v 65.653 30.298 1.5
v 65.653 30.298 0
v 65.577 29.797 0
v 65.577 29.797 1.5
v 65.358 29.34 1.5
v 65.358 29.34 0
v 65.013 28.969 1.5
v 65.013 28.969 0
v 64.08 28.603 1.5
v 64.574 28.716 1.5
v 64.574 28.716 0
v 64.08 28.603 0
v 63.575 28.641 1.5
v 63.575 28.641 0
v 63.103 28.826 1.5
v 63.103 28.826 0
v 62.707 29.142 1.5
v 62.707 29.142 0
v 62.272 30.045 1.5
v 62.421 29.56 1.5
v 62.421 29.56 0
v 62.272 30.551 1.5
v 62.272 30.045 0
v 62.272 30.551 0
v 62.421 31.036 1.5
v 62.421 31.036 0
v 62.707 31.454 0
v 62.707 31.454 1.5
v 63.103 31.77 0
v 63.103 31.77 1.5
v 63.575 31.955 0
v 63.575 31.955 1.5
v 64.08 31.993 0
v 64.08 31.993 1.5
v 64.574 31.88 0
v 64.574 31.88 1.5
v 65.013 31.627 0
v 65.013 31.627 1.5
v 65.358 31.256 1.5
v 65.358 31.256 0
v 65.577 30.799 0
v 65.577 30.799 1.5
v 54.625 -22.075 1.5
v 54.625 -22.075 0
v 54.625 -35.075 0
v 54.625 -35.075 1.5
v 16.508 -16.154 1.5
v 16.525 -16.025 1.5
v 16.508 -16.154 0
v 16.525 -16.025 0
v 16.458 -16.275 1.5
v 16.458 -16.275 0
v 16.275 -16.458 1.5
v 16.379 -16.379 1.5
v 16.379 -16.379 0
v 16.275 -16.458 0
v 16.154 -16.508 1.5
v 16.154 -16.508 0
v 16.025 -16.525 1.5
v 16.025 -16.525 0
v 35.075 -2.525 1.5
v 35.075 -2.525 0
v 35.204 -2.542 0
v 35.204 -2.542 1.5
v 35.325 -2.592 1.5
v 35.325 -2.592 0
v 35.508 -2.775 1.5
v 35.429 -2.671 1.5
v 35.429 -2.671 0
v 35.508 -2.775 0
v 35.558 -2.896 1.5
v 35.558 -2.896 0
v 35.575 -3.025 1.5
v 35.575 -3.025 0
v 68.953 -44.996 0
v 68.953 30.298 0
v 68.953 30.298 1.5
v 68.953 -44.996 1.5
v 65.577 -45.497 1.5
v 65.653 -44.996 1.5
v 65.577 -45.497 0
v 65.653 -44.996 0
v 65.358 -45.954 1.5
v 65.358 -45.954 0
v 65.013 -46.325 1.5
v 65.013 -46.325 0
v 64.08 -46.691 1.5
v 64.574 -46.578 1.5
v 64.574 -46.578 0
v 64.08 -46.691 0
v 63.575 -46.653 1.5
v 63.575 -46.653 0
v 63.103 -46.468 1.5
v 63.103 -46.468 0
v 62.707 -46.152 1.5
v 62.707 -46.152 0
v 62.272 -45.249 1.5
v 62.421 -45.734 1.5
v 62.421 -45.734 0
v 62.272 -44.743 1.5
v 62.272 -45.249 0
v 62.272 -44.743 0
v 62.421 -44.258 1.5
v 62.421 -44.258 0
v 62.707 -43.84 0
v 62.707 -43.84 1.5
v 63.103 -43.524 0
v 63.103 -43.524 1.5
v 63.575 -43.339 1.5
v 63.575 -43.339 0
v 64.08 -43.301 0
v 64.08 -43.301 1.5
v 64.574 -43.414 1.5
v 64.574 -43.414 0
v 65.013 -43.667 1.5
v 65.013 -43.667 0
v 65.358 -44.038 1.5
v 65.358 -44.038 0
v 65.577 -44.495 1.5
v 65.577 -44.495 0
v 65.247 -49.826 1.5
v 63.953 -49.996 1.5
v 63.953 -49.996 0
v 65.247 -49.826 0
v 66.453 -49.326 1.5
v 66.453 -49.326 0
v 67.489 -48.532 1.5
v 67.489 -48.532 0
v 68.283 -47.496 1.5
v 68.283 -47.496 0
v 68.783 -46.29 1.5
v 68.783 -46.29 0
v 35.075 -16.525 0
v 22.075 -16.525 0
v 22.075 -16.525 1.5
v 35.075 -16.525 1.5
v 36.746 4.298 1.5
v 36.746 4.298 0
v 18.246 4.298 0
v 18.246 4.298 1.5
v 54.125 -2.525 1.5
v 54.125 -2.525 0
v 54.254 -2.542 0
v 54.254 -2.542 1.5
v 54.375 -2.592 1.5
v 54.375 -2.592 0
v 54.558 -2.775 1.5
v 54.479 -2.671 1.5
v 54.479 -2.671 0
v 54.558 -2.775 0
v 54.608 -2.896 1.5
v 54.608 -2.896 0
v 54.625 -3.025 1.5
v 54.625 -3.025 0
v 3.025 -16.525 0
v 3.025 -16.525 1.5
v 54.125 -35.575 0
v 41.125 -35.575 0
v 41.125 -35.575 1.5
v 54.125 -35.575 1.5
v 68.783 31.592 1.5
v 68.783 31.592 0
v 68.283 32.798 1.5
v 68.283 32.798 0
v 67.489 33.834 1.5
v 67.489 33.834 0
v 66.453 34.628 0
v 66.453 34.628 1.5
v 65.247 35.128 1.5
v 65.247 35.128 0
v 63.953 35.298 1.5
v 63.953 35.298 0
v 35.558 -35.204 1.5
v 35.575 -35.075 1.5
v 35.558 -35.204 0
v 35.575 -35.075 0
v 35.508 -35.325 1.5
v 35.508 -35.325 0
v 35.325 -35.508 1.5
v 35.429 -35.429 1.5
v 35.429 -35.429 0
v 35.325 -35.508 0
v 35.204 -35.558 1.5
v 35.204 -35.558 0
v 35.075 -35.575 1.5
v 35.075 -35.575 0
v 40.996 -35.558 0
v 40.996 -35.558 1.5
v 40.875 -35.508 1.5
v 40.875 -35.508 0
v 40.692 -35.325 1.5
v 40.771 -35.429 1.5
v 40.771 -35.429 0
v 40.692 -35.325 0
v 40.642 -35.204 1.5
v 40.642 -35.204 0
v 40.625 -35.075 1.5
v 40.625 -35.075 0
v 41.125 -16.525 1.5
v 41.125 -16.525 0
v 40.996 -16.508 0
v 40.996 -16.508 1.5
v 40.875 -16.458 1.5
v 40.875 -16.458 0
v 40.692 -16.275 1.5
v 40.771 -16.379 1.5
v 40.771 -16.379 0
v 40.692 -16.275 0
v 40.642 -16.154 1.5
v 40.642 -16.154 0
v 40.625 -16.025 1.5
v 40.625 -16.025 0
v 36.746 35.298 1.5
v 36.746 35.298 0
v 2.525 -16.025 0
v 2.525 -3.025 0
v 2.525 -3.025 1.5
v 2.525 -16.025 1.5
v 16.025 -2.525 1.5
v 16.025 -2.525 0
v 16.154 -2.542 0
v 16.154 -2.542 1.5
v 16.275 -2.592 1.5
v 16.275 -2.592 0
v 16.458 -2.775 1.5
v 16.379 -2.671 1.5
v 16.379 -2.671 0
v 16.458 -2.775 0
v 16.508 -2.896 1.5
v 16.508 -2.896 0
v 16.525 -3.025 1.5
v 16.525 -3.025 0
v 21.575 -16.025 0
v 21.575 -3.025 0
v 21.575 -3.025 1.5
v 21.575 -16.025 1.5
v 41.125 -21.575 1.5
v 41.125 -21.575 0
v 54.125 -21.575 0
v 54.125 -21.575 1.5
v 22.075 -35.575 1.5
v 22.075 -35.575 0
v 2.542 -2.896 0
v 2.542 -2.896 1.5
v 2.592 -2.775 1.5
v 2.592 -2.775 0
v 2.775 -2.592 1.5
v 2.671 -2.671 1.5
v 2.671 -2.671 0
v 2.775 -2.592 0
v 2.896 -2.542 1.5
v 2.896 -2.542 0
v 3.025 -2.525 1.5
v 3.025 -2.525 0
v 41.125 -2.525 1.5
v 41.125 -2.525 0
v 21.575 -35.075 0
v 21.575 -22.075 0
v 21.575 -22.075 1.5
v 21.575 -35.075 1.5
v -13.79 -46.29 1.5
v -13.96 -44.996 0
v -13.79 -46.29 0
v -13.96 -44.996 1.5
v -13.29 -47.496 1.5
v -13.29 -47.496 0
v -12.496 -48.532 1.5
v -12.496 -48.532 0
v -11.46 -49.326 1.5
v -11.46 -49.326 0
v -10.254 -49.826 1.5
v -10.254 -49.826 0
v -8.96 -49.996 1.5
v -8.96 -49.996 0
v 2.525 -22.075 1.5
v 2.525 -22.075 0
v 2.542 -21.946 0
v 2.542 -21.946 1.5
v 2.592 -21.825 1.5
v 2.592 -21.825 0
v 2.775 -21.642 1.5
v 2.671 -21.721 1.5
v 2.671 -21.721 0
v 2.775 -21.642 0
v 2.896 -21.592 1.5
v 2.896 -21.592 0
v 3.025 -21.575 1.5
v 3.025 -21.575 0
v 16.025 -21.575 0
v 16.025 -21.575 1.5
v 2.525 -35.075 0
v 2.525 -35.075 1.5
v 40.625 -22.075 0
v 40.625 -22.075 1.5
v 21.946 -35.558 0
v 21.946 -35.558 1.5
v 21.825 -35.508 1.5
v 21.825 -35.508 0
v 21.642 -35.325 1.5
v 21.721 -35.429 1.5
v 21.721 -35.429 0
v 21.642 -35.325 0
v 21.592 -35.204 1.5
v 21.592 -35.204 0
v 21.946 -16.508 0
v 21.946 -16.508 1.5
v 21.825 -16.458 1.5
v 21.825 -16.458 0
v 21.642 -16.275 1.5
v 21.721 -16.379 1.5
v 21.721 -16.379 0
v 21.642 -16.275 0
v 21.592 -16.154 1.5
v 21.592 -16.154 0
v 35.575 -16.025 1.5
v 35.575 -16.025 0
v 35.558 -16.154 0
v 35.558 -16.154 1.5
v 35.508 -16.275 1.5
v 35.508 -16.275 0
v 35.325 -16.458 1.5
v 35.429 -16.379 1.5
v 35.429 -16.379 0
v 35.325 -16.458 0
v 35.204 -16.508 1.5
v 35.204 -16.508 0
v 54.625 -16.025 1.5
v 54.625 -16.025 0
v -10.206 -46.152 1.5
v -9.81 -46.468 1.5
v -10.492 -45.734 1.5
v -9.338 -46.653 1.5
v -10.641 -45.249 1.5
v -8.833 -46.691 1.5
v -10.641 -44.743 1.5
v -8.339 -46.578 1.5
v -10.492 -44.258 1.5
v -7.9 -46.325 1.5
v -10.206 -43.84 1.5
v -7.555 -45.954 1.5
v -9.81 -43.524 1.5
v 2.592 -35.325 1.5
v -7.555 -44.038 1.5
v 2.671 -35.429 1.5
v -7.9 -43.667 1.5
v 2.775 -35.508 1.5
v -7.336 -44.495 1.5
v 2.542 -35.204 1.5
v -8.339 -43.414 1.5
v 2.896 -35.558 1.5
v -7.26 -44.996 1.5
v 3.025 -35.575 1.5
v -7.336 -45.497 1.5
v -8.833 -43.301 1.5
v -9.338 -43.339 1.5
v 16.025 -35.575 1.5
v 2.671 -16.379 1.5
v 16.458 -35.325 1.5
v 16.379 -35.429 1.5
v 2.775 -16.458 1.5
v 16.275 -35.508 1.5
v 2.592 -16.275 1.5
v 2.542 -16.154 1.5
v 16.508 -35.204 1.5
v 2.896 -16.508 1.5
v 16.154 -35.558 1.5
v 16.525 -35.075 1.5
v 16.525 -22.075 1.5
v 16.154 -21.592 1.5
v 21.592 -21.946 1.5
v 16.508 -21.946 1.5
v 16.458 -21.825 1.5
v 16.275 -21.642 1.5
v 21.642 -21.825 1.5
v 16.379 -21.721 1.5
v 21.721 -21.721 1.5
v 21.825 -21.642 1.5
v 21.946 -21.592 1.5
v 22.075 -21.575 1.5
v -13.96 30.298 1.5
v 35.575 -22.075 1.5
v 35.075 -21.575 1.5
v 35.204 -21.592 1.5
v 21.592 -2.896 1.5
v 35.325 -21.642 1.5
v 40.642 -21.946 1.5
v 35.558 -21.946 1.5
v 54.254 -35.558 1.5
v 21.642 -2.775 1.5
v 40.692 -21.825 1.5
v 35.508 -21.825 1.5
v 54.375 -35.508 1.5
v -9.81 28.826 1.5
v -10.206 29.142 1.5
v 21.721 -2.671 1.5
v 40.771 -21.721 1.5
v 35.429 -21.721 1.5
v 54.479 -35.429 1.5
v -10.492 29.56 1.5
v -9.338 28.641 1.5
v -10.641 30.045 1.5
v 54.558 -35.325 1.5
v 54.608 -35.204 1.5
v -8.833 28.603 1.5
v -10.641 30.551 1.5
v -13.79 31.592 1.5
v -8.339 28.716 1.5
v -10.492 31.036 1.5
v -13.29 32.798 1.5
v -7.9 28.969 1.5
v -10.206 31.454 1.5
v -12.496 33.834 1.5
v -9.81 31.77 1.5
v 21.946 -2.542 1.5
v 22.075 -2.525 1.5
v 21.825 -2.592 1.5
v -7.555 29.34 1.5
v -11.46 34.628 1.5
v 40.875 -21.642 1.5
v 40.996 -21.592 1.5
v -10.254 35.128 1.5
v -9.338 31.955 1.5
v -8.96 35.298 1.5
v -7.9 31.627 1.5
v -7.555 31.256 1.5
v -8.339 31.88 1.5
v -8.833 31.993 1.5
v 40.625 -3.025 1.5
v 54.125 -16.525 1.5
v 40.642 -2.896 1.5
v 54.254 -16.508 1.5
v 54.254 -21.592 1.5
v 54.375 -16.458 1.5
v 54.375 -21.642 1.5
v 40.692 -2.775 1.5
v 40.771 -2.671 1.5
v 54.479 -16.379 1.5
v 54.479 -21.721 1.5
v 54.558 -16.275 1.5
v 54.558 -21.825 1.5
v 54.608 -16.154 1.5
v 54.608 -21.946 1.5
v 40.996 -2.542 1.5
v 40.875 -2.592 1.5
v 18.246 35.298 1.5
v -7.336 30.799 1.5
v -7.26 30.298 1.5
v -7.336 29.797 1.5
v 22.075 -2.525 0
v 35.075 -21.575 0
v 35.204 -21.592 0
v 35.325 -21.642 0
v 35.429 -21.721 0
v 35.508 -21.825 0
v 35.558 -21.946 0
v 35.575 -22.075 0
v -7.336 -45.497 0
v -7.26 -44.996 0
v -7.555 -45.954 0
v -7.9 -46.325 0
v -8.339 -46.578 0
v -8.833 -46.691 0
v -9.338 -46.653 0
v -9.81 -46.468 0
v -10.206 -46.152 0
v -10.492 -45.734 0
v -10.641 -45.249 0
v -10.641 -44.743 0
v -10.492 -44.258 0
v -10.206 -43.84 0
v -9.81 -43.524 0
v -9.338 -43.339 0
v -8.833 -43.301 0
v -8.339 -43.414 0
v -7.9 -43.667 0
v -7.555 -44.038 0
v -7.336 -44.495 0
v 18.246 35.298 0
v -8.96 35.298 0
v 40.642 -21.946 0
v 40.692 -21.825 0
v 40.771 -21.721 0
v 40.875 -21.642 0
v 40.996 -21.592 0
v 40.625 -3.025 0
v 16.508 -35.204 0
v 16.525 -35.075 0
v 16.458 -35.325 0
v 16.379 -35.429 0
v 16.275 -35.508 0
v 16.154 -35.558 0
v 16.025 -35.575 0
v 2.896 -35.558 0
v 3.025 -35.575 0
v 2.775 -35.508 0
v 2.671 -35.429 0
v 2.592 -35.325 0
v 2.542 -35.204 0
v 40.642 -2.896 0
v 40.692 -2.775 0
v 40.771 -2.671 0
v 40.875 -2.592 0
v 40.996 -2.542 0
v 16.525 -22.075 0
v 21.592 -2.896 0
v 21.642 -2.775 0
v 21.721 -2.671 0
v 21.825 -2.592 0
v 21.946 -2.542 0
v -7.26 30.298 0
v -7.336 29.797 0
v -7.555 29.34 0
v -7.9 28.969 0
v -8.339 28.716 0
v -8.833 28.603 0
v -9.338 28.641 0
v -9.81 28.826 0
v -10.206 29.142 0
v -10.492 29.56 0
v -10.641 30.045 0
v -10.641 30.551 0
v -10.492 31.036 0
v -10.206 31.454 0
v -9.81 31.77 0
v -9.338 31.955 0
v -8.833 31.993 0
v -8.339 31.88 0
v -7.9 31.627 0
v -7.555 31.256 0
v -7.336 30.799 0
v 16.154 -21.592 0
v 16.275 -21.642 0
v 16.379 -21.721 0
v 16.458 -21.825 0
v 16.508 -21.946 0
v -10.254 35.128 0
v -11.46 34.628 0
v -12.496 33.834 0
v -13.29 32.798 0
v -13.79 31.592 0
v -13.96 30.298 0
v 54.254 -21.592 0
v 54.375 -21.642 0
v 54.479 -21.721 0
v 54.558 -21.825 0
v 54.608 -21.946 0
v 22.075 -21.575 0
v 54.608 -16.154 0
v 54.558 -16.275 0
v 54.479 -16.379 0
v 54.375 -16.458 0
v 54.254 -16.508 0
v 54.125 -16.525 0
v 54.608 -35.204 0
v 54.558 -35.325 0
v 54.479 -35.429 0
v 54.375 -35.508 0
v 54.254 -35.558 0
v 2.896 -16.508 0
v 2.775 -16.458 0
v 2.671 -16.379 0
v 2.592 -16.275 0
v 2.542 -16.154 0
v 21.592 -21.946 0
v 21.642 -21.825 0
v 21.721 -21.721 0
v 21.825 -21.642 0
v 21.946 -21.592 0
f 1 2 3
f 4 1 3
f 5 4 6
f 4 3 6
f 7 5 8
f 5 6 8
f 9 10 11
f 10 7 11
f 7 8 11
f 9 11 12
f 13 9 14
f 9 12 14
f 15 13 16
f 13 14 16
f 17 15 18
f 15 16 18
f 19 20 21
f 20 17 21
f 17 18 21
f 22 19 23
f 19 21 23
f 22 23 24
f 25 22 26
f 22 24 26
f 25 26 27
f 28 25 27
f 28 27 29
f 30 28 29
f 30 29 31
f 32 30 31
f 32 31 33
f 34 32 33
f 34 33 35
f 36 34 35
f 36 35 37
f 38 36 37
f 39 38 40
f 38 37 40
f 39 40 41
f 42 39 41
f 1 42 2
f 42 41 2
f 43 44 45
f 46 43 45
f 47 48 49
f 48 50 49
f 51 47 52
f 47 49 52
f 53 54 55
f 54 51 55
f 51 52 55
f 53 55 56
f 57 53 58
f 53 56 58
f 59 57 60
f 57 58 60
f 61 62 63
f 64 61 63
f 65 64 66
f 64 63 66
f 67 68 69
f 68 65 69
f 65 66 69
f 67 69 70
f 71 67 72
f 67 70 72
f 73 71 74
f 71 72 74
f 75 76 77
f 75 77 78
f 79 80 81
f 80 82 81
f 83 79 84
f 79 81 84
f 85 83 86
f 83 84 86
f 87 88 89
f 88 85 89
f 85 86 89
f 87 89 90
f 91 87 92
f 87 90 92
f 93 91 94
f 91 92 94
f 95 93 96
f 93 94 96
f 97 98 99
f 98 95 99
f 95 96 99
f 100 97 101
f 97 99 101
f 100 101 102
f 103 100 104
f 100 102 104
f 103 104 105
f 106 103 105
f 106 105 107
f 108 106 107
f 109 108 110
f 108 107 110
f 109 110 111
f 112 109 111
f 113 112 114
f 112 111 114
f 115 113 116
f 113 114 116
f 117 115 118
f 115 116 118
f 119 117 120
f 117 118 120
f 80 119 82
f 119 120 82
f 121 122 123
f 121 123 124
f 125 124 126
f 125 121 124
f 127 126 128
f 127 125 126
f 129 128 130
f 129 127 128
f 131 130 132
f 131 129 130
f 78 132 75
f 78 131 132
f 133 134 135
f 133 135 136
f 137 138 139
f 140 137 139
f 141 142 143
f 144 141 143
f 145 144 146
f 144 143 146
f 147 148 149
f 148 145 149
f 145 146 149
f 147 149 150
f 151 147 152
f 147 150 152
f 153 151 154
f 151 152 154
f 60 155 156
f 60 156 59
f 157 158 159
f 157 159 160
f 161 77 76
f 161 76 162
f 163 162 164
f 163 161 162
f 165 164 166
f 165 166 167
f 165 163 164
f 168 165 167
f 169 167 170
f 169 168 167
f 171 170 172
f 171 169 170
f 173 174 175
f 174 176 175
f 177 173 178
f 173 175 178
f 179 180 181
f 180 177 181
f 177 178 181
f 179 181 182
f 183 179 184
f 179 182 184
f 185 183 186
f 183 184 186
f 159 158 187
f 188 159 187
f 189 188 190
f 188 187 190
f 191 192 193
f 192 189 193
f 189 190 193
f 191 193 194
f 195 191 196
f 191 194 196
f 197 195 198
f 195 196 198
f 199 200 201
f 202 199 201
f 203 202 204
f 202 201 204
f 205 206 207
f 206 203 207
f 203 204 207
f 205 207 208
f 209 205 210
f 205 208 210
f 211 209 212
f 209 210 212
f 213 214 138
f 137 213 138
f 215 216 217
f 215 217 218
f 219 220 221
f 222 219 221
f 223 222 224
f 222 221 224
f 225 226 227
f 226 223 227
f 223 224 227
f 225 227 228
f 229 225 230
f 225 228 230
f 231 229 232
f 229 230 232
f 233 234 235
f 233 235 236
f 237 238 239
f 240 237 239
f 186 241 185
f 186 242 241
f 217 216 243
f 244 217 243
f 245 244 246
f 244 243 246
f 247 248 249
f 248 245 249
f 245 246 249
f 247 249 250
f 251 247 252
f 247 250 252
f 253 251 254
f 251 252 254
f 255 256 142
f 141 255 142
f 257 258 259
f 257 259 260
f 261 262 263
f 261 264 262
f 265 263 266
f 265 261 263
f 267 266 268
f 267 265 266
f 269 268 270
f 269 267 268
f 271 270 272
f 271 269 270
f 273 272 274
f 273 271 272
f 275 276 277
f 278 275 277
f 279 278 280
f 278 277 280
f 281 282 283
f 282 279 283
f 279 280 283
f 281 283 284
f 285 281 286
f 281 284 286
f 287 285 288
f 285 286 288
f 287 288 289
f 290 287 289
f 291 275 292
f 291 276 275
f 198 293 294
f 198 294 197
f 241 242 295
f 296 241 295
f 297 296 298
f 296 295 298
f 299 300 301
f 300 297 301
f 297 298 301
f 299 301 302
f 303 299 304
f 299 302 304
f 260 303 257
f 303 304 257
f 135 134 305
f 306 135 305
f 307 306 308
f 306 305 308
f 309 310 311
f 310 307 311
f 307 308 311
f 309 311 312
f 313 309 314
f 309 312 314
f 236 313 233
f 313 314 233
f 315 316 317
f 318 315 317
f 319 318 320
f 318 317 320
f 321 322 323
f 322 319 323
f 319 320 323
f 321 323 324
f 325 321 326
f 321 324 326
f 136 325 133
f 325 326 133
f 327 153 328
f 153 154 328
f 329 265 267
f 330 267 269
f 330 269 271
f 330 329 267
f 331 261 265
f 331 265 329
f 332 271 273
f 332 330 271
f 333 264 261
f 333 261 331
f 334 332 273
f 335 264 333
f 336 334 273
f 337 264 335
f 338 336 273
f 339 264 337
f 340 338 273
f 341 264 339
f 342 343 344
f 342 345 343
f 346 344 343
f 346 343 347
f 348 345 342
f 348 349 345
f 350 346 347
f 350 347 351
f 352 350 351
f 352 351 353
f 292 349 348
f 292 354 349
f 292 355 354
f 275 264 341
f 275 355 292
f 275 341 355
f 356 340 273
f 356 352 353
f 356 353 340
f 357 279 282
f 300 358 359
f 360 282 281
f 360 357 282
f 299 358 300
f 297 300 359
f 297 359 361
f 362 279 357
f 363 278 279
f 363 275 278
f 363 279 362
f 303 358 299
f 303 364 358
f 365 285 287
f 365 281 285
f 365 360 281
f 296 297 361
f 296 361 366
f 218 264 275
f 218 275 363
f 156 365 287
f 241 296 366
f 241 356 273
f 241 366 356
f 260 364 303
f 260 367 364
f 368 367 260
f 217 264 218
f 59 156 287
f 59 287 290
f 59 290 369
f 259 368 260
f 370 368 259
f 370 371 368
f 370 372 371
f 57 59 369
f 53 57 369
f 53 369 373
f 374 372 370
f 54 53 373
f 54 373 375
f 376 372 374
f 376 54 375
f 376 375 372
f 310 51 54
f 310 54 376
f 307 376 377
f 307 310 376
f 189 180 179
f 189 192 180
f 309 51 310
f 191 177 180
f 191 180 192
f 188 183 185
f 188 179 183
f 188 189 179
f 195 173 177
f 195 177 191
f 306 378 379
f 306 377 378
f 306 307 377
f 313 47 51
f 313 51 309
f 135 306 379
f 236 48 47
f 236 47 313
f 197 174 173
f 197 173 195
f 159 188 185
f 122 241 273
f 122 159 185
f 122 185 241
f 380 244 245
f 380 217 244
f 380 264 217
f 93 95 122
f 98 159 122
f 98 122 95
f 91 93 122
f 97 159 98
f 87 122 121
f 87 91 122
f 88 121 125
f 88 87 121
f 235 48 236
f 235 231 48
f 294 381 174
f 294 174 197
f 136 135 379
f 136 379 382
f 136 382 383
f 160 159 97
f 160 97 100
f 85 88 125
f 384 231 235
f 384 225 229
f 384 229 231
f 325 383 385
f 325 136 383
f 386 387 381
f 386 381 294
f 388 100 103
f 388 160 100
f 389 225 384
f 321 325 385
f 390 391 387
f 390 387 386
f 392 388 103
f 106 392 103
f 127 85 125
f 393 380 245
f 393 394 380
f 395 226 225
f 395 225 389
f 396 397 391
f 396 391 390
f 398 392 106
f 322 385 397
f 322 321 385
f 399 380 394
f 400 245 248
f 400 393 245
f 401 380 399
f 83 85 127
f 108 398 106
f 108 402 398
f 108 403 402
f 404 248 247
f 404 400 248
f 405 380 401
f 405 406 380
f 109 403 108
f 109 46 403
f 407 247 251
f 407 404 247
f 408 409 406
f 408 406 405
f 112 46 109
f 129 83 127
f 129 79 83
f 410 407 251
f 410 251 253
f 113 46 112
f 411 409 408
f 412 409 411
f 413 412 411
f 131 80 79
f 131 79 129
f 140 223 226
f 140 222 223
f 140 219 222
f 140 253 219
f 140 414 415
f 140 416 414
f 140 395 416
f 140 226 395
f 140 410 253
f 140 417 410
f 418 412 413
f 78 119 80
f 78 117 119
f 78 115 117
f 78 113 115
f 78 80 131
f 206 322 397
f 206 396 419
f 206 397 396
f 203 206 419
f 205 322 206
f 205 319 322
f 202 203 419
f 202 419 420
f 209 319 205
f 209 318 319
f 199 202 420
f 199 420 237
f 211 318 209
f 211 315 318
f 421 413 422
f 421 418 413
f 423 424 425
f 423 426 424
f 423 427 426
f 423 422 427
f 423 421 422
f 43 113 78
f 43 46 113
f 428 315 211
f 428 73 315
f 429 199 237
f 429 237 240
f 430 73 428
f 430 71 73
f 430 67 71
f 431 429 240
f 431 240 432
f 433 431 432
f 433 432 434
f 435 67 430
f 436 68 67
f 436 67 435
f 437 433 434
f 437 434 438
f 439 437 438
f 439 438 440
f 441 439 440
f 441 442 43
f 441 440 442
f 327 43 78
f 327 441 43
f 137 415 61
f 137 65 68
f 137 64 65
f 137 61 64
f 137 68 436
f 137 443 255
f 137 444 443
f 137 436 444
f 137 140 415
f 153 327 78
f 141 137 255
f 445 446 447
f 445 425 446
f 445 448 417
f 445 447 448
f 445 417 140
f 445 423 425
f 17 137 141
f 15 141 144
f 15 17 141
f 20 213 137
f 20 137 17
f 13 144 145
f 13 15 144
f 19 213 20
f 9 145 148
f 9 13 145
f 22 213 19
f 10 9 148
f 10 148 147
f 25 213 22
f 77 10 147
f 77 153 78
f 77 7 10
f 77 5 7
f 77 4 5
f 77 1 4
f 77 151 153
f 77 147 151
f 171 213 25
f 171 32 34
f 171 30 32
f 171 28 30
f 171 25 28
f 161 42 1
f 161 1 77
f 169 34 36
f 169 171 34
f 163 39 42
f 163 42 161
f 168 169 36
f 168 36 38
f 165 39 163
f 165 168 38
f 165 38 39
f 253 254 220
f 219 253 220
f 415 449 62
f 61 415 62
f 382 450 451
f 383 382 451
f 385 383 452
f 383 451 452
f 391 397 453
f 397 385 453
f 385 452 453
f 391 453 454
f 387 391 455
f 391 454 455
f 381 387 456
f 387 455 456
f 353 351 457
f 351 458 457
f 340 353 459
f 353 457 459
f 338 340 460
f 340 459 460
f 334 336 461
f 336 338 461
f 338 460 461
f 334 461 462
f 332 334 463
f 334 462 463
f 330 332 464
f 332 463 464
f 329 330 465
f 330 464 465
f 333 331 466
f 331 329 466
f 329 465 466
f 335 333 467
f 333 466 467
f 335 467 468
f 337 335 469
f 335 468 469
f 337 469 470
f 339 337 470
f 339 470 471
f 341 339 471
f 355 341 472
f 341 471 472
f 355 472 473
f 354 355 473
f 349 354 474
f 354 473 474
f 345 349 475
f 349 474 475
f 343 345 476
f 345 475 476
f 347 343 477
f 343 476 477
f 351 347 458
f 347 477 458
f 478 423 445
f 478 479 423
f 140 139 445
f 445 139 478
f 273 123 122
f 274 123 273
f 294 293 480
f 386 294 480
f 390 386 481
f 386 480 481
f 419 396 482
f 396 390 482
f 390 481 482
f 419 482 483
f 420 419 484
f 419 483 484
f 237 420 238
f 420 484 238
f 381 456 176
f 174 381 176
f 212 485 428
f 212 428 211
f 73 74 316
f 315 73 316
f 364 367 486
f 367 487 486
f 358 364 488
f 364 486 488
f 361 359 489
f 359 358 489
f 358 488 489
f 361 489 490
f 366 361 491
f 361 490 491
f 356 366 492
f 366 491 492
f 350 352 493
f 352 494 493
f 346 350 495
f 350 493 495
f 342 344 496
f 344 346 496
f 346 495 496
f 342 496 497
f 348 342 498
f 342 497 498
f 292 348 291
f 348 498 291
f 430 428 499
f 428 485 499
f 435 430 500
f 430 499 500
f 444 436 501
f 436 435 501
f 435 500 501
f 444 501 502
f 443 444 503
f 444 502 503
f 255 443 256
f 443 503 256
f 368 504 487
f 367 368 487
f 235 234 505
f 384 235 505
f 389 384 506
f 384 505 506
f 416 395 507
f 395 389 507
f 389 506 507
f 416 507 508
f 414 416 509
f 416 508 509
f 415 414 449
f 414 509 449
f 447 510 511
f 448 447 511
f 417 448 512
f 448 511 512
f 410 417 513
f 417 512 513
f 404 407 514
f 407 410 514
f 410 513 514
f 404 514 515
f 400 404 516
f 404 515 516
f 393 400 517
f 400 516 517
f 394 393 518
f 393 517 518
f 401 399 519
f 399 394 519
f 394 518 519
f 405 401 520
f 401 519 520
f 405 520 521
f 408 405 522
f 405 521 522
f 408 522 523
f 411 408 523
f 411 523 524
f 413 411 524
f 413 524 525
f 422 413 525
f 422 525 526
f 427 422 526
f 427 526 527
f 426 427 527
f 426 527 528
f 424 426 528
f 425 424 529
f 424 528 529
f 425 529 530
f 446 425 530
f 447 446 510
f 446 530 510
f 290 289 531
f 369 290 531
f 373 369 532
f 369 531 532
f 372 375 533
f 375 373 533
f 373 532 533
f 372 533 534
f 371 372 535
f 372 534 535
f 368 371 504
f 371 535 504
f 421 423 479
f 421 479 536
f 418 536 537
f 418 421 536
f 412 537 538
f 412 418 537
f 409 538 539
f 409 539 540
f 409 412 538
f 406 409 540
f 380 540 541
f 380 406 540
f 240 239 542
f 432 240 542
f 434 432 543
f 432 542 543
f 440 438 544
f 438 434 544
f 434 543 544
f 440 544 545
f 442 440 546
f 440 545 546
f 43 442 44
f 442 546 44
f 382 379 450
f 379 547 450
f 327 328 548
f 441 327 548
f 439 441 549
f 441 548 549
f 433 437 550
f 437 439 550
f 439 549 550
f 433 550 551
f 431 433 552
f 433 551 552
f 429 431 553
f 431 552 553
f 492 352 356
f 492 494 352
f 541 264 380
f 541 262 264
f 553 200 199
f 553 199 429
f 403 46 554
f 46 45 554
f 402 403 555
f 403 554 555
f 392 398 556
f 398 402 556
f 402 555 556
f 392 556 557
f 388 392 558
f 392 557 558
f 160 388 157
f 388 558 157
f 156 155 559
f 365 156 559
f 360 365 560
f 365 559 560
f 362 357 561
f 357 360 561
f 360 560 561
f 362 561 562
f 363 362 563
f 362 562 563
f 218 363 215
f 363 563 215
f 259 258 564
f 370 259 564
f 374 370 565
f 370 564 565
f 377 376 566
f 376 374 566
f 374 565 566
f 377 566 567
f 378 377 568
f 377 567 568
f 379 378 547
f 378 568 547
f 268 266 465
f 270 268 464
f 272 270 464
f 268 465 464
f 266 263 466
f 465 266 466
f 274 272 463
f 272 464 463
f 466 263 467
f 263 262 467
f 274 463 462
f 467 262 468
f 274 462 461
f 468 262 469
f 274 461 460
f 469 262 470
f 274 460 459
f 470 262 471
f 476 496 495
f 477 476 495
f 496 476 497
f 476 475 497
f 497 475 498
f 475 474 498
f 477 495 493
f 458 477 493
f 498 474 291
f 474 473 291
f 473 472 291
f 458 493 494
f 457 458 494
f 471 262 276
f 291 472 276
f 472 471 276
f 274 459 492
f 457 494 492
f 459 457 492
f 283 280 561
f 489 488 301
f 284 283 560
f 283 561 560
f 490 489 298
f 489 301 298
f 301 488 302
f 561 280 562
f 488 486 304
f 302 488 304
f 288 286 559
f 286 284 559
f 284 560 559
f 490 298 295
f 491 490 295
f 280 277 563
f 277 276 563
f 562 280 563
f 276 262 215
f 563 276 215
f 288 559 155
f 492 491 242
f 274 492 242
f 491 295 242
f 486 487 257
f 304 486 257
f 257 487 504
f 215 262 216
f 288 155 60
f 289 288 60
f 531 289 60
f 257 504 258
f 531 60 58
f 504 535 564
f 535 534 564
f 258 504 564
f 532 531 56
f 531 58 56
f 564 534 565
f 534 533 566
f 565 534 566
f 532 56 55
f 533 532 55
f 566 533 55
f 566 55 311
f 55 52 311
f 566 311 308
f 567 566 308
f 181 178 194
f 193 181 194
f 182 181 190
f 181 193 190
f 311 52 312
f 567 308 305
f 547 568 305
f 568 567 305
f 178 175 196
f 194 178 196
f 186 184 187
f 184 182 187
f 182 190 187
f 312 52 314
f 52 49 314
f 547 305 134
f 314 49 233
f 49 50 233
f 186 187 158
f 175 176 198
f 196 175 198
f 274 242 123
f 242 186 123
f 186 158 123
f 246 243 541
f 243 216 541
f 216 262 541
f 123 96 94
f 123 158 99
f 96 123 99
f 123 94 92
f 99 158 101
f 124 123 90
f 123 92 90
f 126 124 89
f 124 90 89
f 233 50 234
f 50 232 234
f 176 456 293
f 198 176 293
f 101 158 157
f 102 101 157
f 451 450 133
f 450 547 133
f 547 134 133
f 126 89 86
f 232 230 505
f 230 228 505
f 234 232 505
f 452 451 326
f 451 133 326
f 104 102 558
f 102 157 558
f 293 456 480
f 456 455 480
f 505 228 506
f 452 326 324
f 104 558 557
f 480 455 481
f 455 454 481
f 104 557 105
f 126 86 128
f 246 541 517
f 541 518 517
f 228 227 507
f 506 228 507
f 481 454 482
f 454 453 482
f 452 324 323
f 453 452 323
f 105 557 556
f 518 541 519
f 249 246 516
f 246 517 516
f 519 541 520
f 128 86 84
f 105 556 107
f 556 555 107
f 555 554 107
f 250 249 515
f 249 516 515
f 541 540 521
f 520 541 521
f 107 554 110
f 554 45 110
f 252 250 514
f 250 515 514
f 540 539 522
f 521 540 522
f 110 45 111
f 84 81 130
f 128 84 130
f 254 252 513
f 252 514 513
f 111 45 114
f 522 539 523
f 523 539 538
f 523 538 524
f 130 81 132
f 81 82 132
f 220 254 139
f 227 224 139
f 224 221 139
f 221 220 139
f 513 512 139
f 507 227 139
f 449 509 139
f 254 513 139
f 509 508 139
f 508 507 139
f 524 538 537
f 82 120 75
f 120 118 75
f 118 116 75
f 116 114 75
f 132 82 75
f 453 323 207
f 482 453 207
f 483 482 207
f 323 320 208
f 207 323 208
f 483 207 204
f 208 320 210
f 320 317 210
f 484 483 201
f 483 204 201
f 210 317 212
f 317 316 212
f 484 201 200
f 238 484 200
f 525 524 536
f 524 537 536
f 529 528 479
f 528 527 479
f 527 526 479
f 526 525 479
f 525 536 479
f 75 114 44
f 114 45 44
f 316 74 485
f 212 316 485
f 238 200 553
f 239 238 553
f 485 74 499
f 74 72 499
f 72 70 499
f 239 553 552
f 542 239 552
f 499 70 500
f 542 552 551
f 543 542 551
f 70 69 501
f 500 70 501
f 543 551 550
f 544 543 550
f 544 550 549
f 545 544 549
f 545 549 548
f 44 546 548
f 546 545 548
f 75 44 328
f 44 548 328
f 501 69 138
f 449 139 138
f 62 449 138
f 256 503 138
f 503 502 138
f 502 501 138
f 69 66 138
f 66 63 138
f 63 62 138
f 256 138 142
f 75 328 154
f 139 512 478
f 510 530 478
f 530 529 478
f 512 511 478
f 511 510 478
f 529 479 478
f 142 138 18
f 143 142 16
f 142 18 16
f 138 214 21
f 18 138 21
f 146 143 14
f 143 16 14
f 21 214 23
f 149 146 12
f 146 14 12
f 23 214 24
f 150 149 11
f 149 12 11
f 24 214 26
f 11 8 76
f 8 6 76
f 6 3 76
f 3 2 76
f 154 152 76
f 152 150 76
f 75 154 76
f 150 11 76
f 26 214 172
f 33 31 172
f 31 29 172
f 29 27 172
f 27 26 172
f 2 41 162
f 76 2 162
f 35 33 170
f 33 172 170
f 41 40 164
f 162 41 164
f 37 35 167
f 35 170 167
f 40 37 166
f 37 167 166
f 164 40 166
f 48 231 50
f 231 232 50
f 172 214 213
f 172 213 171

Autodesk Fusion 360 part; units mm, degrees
sketch "plate-2026-01-28T23_59_03.859Z" plane through (0, 0, 0) normal (0, 0, 1) x (1, 0, 0)
  line L0 (3.025, -2.525) -> (16.025, -2.525)
  line L1 (3.025, -16.525) -> (16.025, -16.525)
  line L2 (2.525, -3.025) -> (2.525, -16.025)
  line L3 (16.525, -3.025) -> (16.525, -16.025)
  arc A0 (3.025, -2.525) -> (2.525, -3.025) centre (3.025, -3.025) ccw
  arc A1 (16.525, -3.025) -> (16.025, -2.525) centre (16.025, -3.025) ccw
  arc A2 (2.525, -16.025) -> (3.025, -16.525) centre (3.025, -16.025) ccw
  arc A3 (16.025, -16.525) -> (16.525, -16.025) centre (16.025, -16.025) ccw
  line L4 (22.075, -2.525) -> (35.075, -2.525)
  line L5 (22.075, -16.525) -> (35.075, -16.525)
  line L6 (21.575, -3.025) -> (21.575, -16.025)
  line L7 (35.575, -3.025) -> (35.575, -16.025)
  arc A4 (22.075, -2.525) -> (21.575, -3.025) centre (22.075, -3.025) ccw
  arc A5 (35.575, -3.025) -> (35.075, -2.525) centre (35.075, -3.025) ccw
  arc A6 (21.575, -16.025) -> (22.075, -16.525) centre (22.075, -16.025) ccw
  arc A7 (35.075, -16.525) -> (35.575, -16.025) centre (35.075, -16.025) ccw
  line L8 (41.125, -2.525) -> (54.125, -2.525)
  line L9 (41.125, -16.525) -> (54.125, -16.525)
  line L10 (40.625, -3.025) -> (40.625, -16.025)
  line L11 (54.625, -3.025) -> (54.625, -16.025)
  arc A8 (41.125, -2.525) -> (40.625, -3.025) centre (41.125, -3.025) ccw
  arc A9 (54.625, -3.025) -> (54.125, -2.525) centre (54.125, -3.025) ccw
  arc A10 (40.625, -16.025) -> (41.125, -16.525) centre (41.125, -16.025) ccw
  arc A11 (54.125, -16.525) -> (54.625, -16.025) centre (54.125, -16.025) ccw
  line L12 (3.025, -21.575) -> (16.025, -21.575)
  line L13 (3.025, -35.575) -> (16.025, -35.575)
  line L14 (2.525, -22.075) -> (2.525, -35.075)
  line L15 (16.525, -22.075) -> (16.525, -35.075)
  arc A12 (3.025, -21.575) -> (2.525, -22.075) centre (3.025, -22.075) ccw
  arc A13 (16.525, -22.075) -> (16.025, -21.575) centre (16.025, -22.075) ccw
  arc A14 (2.525, -35.075) -> (3.025, -35.575) centre (3.025, -35.075) ccw
  arc A15 (16.025, -35.575) -> (16.525, -35.075) centre (16.025, -35.075) ccw
  line L16 (22.075, -21.575) -> (35.075, -21.575)
  line L17 (22.075, -35.575) -> (35.075, -35.575)
  line L18 (21.575, -22.075) -> (21.575, -35.075)
  line L19 (35.575, -22.075) -> (35.575, -35.075)
  arc A16 (22.075, -21.575) -> (21.575, -22.075) centre (22.075, -22.075) ccw
  arc A17 (35.575, -22.075) -> (35.075, -21.575) centre (35.075, -22.075) ccw
  arc A18 (21.575, -35.075) -> (22.075, -35.575) centre (22.075, -35.075) ccw
  arc A19 (35.075, -35.575) -> (35.575, -35.075) centre (35.075, -35.075) ccw
  line L20 (41.125, -21.575) -> (54.125, -21.575)
  line L21 (41.125, -35.575) -> (54.125, -35.575)
  line L22 (40.625, -22.075) -> (40.625, -35.075)
  line L23 (54.625, -22.075) -> (54.625, -35.075)
  arc A20 (41.125, -21.575) -> (40.625, -22.075) centre (41.125, -22.075) ccw
  arc A21 (54.625, -22.075) -> (54.125, -21.575) centre (54.125, -22.075) ccw
  arc A22 (40.625, -35.075) -> (41.125, -35.575) centre (41.125, -35.075) ccw
  arc A23 (54.125, -35.575) -> (54.625, -35.075) centre (54.125, -35.075) ccw
sketch "Sketch2" plane through (0, 0, 0) normal (0, 0, 1) x (1, 0, 0)
sketch "Sketch3" plane through (0, 0, 0) normal (0, 0, 1) x (1, 0, 0)
  line L0 (-13.96, 35.298) -> (68.953, 35.298)
  line L1 (68.953, 35.298) -> (68.953, -49.996)
  line L2 (68.953, -49.996) -> (-13.96, -49.996)
  line L3 (-13.96, -49.996) -> (-13.96, 35.298)
  circle A0 centre (-8.96, 30.298) radius 1.7
  circle A1 centre (63.953, 30.298) radius 1.7
  circle A2 centre (-8.96, -44.996) radius 1.7
  circle A3 centre (63.953, -44.996) radius 1.7
  line L4 (18.2465, 35.298) -> (36.7465, 35.298)
  line L5 (36.7465, 35.298) -> (36.7465, 4.298)
  line L6 (36.7465, 4.298) -> (18.2465, 4.298)
  line L7 (18.2465, 4.298) -> (18.2465, 35.298)
  line L8 (2.525, -22.075) -> (2.525, -35.075)
  line L9 (3.025, -35.575) -> (16.025, -35.575)
  dimension "d1" = 82.913
  dimension "d2" = 85.294
  dimension "d5" = 3.4
  dimension "d6" = 3.4
  dimension "d7" = 3.4
  dimension "d8" = 3.4
  dimension "d9" = 5
  dimension "d10" = 5
  dimension "d11" = 5
  dimension "d12" = 5
  dimension "d13" = 5
  dimension "d14" = 5
  dimension "d15" = 5
  dimension "d16" = 5
  dimension "d17" = 18.5
  dimension "d18" = 31
  dimension "d19" = 32.2065
  dimension "d26" = 16.485
  dimension "d27" = 14.421
sketch "Sketch4" plane through (0, 0, 0) normal (0, 0, 1) x (1, 0, 0)
sketch "Sketch5" plane through (0, 0, 0) normal (0, 0, 1) x (1, 0, 0)
extrude "Extrude1" add sketch "Sketch3" along normal blind 1.5 contours L0 L1 L2 L3 L5 L6 L7
sketch "Sketch6" plane through (0, 0, 1.5) normal (0, 0, 1) x (-1, 0, 0)
  circle A0 centre (-63.953, -30.298) radius 1.7
  circle A1 centre (8.96, 44.996) radius 1.7
  circle A2 centre (-63.953, 44.996) radius 1.7
  circle A3 centre (8.96, -30.298) radius 1.7
  line L0 (-36.7465, -35.298) -> (-36.7465, -4.298)
  line L1 (-36.7465, -4.298) -> (-18.2465, -4.298)
  line L2 (-18.2465, -4.298) -> (-18.2465, -35.298)
  line L3 (-18.2465, -35.298) -> (13.96, -35.298)
  line L4 (13.96, -35.298) -> (13.96, 49.996)
  line L5 (13.96, 49.996) -> (-68.953, 49.996)
  line L6 (-68.953, 49.996) -> (-68.953, -35.298)
  line L7 (-68.953, -35.298) -> (-36.7465, -35.298)
extrude "Extrude2" cut sketch "plate-2026-01-28T23_59_03.859Z" along normal blind 1.5
fillet "Fillet1" radius 5 4 edges at (-13.96, -49.996, 0.75) (68.953, -49.996, 0.75) (-13.96, 35.298, 0.75) (68.953, 35.298, 0.75)
sketch "Sketch7" plane through (0, 0, 1.5) normal (0, 0, 1) x (-1, 0, 0)
